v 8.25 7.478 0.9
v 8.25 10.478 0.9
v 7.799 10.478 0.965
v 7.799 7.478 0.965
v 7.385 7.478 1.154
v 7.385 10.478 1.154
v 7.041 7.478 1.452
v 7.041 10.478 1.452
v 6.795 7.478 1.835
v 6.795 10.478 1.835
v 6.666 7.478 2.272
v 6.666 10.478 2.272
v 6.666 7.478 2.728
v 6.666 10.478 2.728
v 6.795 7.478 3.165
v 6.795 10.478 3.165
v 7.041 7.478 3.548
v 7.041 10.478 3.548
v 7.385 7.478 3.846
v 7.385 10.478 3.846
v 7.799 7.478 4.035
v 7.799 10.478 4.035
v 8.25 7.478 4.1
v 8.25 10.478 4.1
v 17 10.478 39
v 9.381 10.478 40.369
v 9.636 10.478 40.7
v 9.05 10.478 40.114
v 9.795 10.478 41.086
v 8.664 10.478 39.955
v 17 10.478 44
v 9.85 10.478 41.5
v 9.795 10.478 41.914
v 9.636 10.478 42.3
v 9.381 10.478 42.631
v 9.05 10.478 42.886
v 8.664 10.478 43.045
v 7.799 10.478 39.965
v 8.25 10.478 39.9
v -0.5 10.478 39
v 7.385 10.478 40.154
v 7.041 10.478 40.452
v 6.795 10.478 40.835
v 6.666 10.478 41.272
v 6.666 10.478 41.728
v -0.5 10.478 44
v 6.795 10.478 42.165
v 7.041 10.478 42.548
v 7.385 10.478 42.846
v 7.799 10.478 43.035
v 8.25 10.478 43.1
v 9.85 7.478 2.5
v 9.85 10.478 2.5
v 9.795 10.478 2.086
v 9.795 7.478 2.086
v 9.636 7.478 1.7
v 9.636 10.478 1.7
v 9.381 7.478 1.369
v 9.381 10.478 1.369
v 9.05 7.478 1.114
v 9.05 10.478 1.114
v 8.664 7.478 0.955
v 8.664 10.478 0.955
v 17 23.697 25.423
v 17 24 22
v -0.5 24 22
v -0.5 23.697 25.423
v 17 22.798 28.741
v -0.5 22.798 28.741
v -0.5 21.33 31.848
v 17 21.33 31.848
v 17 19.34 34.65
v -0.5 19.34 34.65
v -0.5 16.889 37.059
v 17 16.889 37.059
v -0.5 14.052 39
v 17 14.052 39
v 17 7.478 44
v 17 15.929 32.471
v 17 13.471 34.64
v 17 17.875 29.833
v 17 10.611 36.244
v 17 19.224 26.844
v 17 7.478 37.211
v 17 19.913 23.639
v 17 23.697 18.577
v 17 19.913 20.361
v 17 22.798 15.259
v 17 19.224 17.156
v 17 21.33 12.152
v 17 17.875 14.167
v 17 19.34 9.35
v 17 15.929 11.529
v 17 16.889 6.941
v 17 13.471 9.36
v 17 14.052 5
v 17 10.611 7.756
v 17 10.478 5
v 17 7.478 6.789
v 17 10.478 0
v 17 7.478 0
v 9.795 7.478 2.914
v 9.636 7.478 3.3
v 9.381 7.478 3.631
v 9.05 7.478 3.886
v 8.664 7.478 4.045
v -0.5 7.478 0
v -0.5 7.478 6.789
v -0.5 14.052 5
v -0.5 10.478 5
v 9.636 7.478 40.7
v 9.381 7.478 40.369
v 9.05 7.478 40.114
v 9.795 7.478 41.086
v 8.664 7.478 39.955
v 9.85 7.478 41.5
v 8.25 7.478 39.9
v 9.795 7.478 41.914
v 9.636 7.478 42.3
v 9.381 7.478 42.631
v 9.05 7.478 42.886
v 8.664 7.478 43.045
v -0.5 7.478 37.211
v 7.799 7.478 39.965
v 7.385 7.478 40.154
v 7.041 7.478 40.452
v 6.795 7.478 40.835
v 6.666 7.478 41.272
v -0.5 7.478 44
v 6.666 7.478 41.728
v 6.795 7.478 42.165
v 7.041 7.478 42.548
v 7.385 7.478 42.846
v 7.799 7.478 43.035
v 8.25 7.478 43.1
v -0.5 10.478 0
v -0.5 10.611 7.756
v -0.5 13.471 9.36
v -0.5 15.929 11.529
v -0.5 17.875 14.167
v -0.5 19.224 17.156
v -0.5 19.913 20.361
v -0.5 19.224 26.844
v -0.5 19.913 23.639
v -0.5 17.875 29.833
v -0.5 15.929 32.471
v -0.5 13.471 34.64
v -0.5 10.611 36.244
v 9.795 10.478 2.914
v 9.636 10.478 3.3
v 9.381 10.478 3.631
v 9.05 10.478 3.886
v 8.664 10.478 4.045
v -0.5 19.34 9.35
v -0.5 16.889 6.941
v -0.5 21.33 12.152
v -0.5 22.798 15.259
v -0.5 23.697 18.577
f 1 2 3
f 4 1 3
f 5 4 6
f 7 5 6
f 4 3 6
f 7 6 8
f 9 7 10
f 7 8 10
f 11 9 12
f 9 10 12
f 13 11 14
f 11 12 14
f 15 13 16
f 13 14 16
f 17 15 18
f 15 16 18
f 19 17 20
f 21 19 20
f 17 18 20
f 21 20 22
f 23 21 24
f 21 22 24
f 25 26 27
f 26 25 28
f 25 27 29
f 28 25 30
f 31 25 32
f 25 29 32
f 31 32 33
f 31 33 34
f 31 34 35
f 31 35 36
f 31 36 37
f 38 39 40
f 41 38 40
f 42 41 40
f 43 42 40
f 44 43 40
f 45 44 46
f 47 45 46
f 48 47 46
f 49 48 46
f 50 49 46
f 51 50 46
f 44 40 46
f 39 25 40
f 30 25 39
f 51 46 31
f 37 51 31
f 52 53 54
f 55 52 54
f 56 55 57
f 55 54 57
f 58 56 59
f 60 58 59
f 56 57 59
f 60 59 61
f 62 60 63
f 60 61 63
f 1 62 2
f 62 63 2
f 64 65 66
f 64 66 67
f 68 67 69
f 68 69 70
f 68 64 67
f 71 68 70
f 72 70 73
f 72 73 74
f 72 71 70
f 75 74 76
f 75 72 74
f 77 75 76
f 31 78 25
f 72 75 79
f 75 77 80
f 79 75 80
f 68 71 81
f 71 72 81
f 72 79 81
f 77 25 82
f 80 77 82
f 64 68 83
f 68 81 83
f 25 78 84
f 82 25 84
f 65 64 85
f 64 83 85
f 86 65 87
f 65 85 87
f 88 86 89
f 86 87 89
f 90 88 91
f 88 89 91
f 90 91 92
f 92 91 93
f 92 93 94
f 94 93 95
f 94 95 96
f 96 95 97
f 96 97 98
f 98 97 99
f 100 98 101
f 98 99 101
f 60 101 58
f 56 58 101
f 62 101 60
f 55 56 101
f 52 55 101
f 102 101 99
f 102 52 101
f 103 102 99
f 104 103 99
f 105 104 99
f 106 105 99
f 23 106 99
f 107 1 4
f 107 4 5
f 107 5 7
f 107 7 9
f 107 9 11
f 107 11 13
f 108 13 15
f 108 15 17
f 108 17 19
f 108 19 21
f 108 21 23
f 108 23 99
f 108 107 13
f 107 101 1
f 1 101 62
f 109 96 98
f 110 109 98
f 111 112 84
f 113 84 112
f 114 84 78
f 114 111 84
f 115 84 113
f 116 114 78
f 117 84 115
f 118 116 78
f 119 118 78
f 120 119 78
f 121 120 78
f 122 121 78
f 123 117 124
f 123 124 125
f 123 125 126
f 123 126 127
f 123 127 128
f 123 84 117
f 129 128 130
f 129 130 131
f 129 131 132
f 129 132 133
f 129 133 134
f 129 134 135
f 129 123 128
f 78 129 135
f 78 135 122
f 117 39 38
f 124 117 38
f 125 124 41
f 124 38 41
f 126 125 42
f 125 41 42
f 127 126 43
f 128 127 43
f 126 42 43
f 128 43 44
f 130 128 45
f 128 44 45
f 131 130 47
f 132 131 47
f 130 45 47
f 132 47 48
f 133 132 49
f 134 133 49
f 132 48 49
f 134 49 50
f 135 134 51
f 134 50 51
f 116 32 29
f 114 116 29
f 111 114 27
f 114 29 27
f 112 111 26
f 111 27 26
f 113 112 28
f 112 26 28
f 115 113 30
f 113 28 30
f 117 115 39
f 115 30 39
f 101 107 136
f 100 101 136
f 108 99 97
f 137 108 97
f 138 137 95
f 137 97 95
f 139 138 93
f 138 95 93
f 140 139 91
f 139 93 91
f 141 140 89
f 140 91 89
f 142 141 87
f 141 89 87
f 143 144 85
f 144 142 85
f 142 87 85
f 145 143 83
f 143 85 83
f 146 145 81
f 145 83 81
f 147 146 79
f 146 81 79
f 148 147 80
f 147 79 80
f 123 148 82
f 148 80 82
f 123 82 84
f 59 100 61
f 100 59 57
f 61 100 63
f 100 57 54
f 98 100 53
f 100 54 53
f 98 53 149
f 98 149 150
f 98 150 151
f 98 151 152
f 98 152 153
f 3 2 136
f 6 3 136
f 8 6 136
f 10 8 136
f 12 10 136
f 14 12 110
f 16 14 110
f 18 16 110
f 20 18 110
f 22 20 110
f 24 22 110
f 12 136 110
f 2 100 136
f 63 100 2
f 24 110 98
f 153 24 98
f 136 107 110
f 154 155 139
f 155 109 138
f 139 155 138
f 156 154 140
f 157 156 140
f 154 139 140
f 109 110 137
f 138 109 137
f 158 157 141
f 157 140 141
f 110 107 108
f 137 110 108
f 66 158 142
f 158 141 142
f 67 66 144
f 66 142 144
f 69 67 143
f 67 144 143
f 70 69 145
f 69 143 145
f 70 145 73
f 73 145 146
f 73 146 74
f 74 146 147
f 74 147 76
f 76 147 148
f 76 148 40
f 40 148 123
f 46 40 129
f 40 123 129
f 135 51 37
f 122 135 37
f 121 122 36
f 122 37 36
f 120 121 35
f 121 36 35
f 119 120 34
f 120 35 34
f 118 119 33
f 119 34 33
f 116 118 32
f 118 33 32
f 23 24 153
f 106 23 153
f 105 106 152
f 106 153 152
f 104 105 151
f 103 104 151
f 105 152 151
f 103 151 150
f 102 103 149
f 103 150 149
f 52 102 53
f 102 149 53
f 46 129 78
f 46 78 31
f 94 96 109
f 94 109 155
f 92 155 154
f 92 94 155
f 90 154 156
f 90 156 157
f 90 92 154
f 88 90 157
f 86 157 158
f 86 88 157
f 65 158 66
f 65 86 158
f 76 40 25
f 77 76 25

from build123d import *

# Parameters (mm, degrees)
SKETCH_1_W               = 17
SKETCH_1_H               = 40
EXTRUDE_1_DEPTH          = 50
SKETCH_2_W               = 17
SKETCH_2_H               = 1
CUT_EXTRUDE_1_DEPTH      = 67.2495283
SKETCH_4_W               = 0.5
SKETCH_4_H               = 39
EXTRUDE_2_DEPTH          = 50
SKETCH_5_R               = 15.5
CUT_EXTRUDE_2_DEPTH      = 17.5
CUT_EXTRUDE_3_DEPTH      = 17.5
CUT_EXTRUDE_4_DEPTH      = 3
CUT_EXTRUDE_START        = -64
CUT_EXTRUDE_7_DEPTH      = 64
SKETCH_9_W               = 5
SKETCH_9_H               = 3
EXTRUDE_3_DEPTH          = 17.5
CUT_EXTRUDE_8_DEPTH      = 54.087192429
CUT_EXTRUDE_8_DEPTH_BACK = 54.087192429
CUT_EXTRUDE_10_REACH     = 51.07
CUT_EXTRUDE_11_REACH     = 55.087


with BuildPart() as part:
    # 草图1 → 凸台-拉伸1 (new body)
    with BuildSketch(Plane(origin=(0, 0, 0), x_dir=(1, 0, 0), z_dir=(0, 1, 0))):
        with Locations((8.5, -20)):
            Rectangle(SKETCH_1_W, SKETCH_1_H)
    extrude(amount=EXTRUDE_1_DEPTH)

    # 草图2 → 切除-拉伸1 (cut, through all)
    with BuildSketch(Plane.XZ):
        with Locations((8.5, 39.5)):
            Rectangle(SKETCH_2_W, SKETCH_2_H)
    extrude(amount=-CUT_EXTRUDE_1_DEPTH, mode=Mode.SUBTRACT)

    # 草图4 → 凸台-拉伸2 (add)
    with BuildSketch(Plane.XZ):
        with Locations((-0.25, 19.5)):
            Rectangle(SKETCH_4_W, SKETCH_4_H)
    extrude(amount=-EXTRUDE_2_DEPTH)

    # 草图5 → 切除-拉伸2 (cut)
    with BuildSketch(Plane(origin=(17, 0, 0), x_dir=(0, 0, -1), z_dir=(1, 0, 0))):
        with Locations((-22, 4.5)):
            Circle(SKETCH_5_R)
    extrude(amount=-CUT_EXTRUDE_2_DEPTH, mode=Mode.SUBTRACT)

    # 草图6 → 切除-拉伸3 (cut)
    with BuildSketch(Plane(origin=(17, 0, 0), x_dir=(0, 0, -1), z_dir=(1, 0, 0))):
        Polygon((0, 3), (0, 24), (0, 50), (-39, 50), (-39, 24), (-22, 24), (-5, 24), (-5, 3), align=None)
    extrude(amount=-CUT_EXTRUDE_3_DEPTH, mode=Mode.SUBTRACT)

    # 草图7 → 切除-拉伸4 (cut)
    with BuildSketch(Plane(origin=(0, 3, 0), x_dir=(1, 0, 0), z_dir=(0, 1, 0))):
        with BuildLine():
            ThreePointArc((8.25, -0.9), (6.65, -2.5), (8.25, -4.1))
            Line((8.25, -4.1), (8.25, -0.9))
        make_face()
        with BuildLine():
            Line((8.25, -0.9), (8.25, -4.1))
            ThreePointArc((8.25, -4.1), (9.38137085, -3.63137085), (9.85, -2.5))
            ThreePointArc((9.85, -2.5), (9.38137085, -1.36862915), (8.25, -0.9))
        make_face()
    extrude(amount=-CUT_EXTRUDE_4_DEPTH, mode=Mode.SUBTRACT)

    # 草图8 → 切除-拉伸7 (cut)
    with BuildSketch(Plane.ZY.offset(0.5).offset(CUT_EXTRUDE_START)):
        with BuildLine():
            Line((5, 3), (5, 4.5))
            Line((5, 4.5), (-8.613521725, 4.5))
            Line((-8.613521725, 4.5), (17.256515703, -28.446816898))
            Line((17.256515703, -28.446816898), (39, 0))
            Line((39, 0), (36.832396974, 0))
            ThreePointArc((36.832396974, 0), (22, -11), (7.167603026, 0))
            Line((7.167603026, 0), (0, 0))
            Line((0, 0), (0, 3))
            Line((0, 3), (5, 3))
        make_face()
        with BuildLine():
            ThreePointArc((7.167603026, 0), (6.667809141, 2.225373998), (6.5, 4.5))
            Line((6.5, 4.5), (5, 4.5))
            Line((5, 4.5), (5, 3))
            Line((5, 3), (0, 3))
            Line((0, 3), (0, 0))
            Line((0, 0), (7.167603026, 0))
        make_face()
        with BuildLine():
            Line((37.5, 4.5), (22, 4.5))
            Line((22, 4.5), (6.5, 4.5))
            ThreePointArc((6.5, 4.5), (6.667809141, 2.225373998), (7.167603026, 0))
            ThreePointArc((7.167603026, 0), (22, -11), (36.832396974, 0))
            ThreePointArc((36.832396974, 0), (37.332190859, 2.225373998), (37.5, 4.5))
        make_face()
        with BuildLine():
            Line((6.5, 4.5), (22, 4.5))
            Line((22, 4.5), (37.5, 4.5))
            ThreePointArc((37.5, 4.5), (22, 20), (6.5, 4.5))
        make_face()
        with BuildLine():
            Line((39, 4.5), (37.5, 4.5))
            ThreePointArc((37.5, 4.5), (37.332190859, 2.225373998), (36.832396974, 0))
            Line((36.832396974, 0), (39, 0))
            Line((39, 0), (39, 4.5))
        make_face()
    extrude(amount=CUT_EXTRUDE_7_DEPTH, mode=Mode.SUBTRACT)

    # 草图9 → 凸台-拉伸3 (add)
    with BuildSketch(Plane.ZY.offset(0.5)):
        with Locations((41.5, 8.978432147)):
            Rectangle(SKETCH_9_W, SKETCH_9_H)
        with Locations((2.5, 8.978432147)):
            Rectangle(SKETCH_9_W, SKETCH_9_H)
    extrude(amount=-EXTRUDE_3_DEPTH)

    # 草图10 → 切除-拉伸8 (cut, two sides: drawn at the far end of the back side and taken through both)
    with BuildSketch(Plane.ZY.offset(0.5).offset(-CUT_EXTRUDE_8_DEPTH_BACK)):
        with BuildLine():
            Line((5, 24), (5, 14.052486587))
            ThreePointArc((5, 14.052486587), (12.151738439, 21.330381583), (22, 24))
            Line((22, 24), (5, 24))
        make_face()
        with BuildLine():
            Line((39, 24), (22, 24))
            ThreePointArc((22, 24), (31.848261561, 21.330381583), (39, 14.052486587))
            Line((39, 14.052486587), (39, 24))
        make_face()
    extrude(amount=CUT_EXTRUDE_8_DEPTH + CUT_EXTRUDE_8_DEPTH_BACK, mode=Mode.SUBTRACT)

    # 草图12 → 切除-拉伸10 (cut, up to next)
    with BuildSketch(Plane(origin=(0, 10.478432147, 0), x_dir=(1, 0, 0), z_dir=(0, 1, 0)), mode=Mode.PRIVATE) as cut_extrude_10_sk1:
        with BuildLine():
            ThreePointArc((9.85, -41.5), (9.38137085, -40.36862915), (8.25, -39.9))
            Line((8.25, -39.9), (8.25, -43.1))
            ThreePointArc((8.25, -43.1), (9.38137085, -42.63137085), (9.85, -41.5))
        make_face()
    cut_extrude_10_tool1 = extrude(cut_extrude_10_sk1.sketch, amount=-CUT_EXTRUDE_10_REACH, mode=Mode.PRIVATE) & part.part
    # 草图12 → 切除-拉伸10 (cut, up to next)
    with BuildSketch(Plane(origin=(0, 10.478432147, 0), x_dir=(1, 0, 0), z_dir=(0, 1, 0)), mode=Mode.PRIVATE) as cut_extrude_10_sk2:
        with BuildLine():
            Line((8.25, -43.1), (8.25, -39.9))
            ThreePointArc((8.25, -39.9), (6.65, -41.5), (8.25, -43.1))
        make_face()
    cut_extrude_10_tool2 = extrude(cut_extrude_10_sk2.sketch, amount=-CUT_EXTRUDE_10_REACH, mode=Mode.PRIVATE) & part.part
    # 草图12 → 切除-拉伸10 (cut, up to next)
    with BuildSketch(Plane(origin=(0, 10.478432147, 0), x_dir=(1, 0, 0), z_dir=(0, 1, 0)), mode=Mode.PRIVATE) as cut_extrude_10_sk3:
        with BuildLine():
            ThreePointArc((9.85, -41.5), (9.38137085, -40.36862915), (8.25, -39.9))
            Line((8.25, -39.9), (8.25, -43.1))
            ThreePointArc((8.25, -43.1), (9.38137085, -42.63137085), (9.85, -41.5))
        make_face()
    cut_extrude_10_tool3 = extrude(cut_extrude_10_sk3.sketch, amount=-CUT_EXTRUDE_10_REACH, mode=Mode.PRIVATE) & part.part
    # 草图12 → 切除-拉伸10 (cut, up to next)
    with BuildSketch(Plane(origin=(0, 10.478432147, 0), x_dir=(1, 0, 0), z_dir=(0, 1, 0)), mode=Mode.PRIVATE) as cut_extrude_10_sk4:
        with BuildLine():
            Line((8.25, -43.1), (8.25, -39.9))
            ThreePointArc((8.25, -39.9), (6.65, -41.5), (8.25, -43.1))
        make_face()
    cut_extrude_10_tool4 = extrude(cut_extrude_10_sk4.sketch, amount=-CUT_EXTRUDE_10_REACH, mode=Mode.PRIVATE) & part.part
    # 草图12 → 切除-拉伸10 (cut, up to next)
    with BuildSketch(Plane(origin=(0, 10.478432147, 0), x_dir=(1, 0, 0), z_dir=(0, 1, 0)), mode=Mode.PRIVATE) as cut_extrude_10_sk5:
        with BuildLine():
            ThreePointArc((9.85, -2.5), (9.38137085, -1.36862915), (8.25, -0.9))
            Line((8.25, -0.9), (8.25, -4.1))
            ThreePointArc((8.25, -4.1), (9.38137085, -3.63137085), (9.85, -2.5))
        make_face()
    cut_extrude_10_tool5 = extrude(cut_extrude_10_sk5.sketch, amount=-CUT_EXTRUDE_10_REACH, mode=Mode.PRIVATE) & part.part
    # 草图12 → 切除-拉伸10 (cut, up to next)
    with BuildSketch(Plane(origin=(0, 10.478432147, 0), x_dir=(1, 0, 0), z_dir=(0, 1, 0)), mode=Mode.PRIVATE) as cut_extrude_10_sk6:
        with BuildLine():
            Line((8.25, -4.1), (8.25, -0.9))
            ThreePointArc((8.25, -0.9), (6.65, -2.5), (8.25, -4.1))
        make_face()
    cut_extrude_10_tool6 = extrude(cut_extrude_10_sk6.sketch, amount=-CUT_EXTRUDE_10_REACH, mode=Mode.PRIVATE) & part.part
    # 草图12 → 切除-拉伸10 (cut, up to next)
    with BuildSketch(Plane(origin=(0, 10.478432147, 0), x_dir=(1, 0, 0), z_dir=(0, 1, 0)), mode=Mode.PRIVATE) as cut_extrude_10_sk7:
        with BuildLine():
            ThreePointArc((9.85, -2.5), (9.38137085, -1.36862915), (8.25, -0.9))
            Line((8.25, -0.9), (8.25, -4.1))
            ThreePointArc((8.25, -4.1), (9.38137085, -3.63137085), (9.85, -2.5))
        make_face()
    cut_extrude_10_tool7 = extrude(cut_extrude_10_sk7.sketch, amount=-CUT_EXTRUDE_10_REACH, mode=Mode.PRIVATE) & part.part
    # 草图12 → 切除-拉伸10 (cut, up to next)
    with BuildSketch(Plane(origin=(0, 10.478432147, 0), x_dir=(1, 0, 0), z_dir=(0, 1, 0)), mode=Mode.PRIVATE) as cut_extrude_10_sk8:
        with BuildLine():
            Line((8.25, -4.1), (8.25, -0.9))
            ThreePointArc((8.25, -0.9), (6.65, -2.5), (8.25, -4.1))
        make_face()
    cut_extrude_10_tool8 = extrude(cut_extrude_10_sk8.sketch, amount=-CUT_EXTRUDE_10_REACH, mode=Mode.PRIVATE) & part.part
    add(cut_extrude_10_tool1.solids().sort_by_distance((8.929061, 10.478432, 41.5))[0], mode=Mode.SUBTRACT)
    add(cut_extrude_10_tool2.solids().sort_by_distance((7.570939, 10.478432, 41.5))[0], mode=Mode.SUBTRACT)
    add(cut_extrude_10_tool3.solids().sort_by_distance((8.929061, 10.478432, 41.5))[0], mode=Mode.SUBTRACT)
    add(cut_extrude_10_tool4.solids().sort_by_distance((7.570939, 10.478432, 41.5))[0], mode=Mode.SUBTRACT)
    add(cut_extrude_10_tool5.solids().sort_by_distance((8.929061, 10.478432, 2.5))[0], mode=Mode.SUBTRACT)
    add(cut_extrude_10_tool6.solids().sort_by_distance((7.570939, 10.478432, 2.5))[0], mode=Mode.SUBTRACT)
    add(cut_extrude_10_tool7.solids().sort_by_distance((8.929061, 10.478432, 2.5))[0], mode=Mode.SUBTRACT)
    add(cut_extrude_10_tool8.solids().sort_by_distance((7.570939, 10.478432, 2.5))[0], mode=Mode.SUBTRACT)

    # 草图13 → 切除-拉伸11 (cut, up to next)
    with BuildSketch(Plane(origin=(17, 0, 0), x_dir=(0, 0, -1), z_dir=(1, 0, 0)), mode=Mode.PRIVATE) as cut_extrude_11_sk1:
        Polygon((-39, 7.478432147), (-37.21114532, 7.478432147), (-37.5, 4.5), (-39, 4.5), align=None)
    cut_extrude_11_tool1 = extrude(cut_extrude_11_sk1.sketch, amount=-CUT_EXTRUDE_11_REACH, mode=Mode.PRIVATE) & part.part
    # 草图13 → 切除-拉伸11 (cut, up to next)
    with BuildSketch(Plane(origin=(17, 0, 0), x_dir=(0, 0, -1), z_dir=(1, 0, 0)), mode=Mode.PRIVATE) as cut_extrude_11_sk2:
        Polygon((-5, 7.478432147), (-6.78885468, 7.478432147), (-6.5, 4.5), (-5, 4.5), align=None)
    cut_extrude_11_tool2 = extrude(cut_extrude_11_sk2.sketch, amount=-CUT_EXTRUDE_11_REACH, mode=Mode.PRIVATE) & part.part
    add(cut_extrude_11_tool1.solids().sort_by_distance((17, 6.032815, 38.175672))[0], mode=Mode.SUBTRACT)
    add(cut_extrude_11_tool2.solids().sort_by_distance((17, 6.032815, 5.824328))[0], mode=Mode.SUBTRACT)


solid = part.part
